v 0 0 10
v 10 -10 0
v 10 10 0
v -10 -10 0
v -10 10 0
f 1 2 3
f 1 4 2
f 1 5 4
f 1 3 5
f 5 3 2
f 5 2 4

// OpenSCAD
polyhedron(points=[[10, 10, 0], [10, -10, 0], [-10, -10, 0], [-10, 10, 0], [0, 0, 10]], faces=[[0, 1, 4], [1, 2, 4], [2, 3, 4], [3, 0, 4], [1, 0, 3], [2, 1, 3]]);
